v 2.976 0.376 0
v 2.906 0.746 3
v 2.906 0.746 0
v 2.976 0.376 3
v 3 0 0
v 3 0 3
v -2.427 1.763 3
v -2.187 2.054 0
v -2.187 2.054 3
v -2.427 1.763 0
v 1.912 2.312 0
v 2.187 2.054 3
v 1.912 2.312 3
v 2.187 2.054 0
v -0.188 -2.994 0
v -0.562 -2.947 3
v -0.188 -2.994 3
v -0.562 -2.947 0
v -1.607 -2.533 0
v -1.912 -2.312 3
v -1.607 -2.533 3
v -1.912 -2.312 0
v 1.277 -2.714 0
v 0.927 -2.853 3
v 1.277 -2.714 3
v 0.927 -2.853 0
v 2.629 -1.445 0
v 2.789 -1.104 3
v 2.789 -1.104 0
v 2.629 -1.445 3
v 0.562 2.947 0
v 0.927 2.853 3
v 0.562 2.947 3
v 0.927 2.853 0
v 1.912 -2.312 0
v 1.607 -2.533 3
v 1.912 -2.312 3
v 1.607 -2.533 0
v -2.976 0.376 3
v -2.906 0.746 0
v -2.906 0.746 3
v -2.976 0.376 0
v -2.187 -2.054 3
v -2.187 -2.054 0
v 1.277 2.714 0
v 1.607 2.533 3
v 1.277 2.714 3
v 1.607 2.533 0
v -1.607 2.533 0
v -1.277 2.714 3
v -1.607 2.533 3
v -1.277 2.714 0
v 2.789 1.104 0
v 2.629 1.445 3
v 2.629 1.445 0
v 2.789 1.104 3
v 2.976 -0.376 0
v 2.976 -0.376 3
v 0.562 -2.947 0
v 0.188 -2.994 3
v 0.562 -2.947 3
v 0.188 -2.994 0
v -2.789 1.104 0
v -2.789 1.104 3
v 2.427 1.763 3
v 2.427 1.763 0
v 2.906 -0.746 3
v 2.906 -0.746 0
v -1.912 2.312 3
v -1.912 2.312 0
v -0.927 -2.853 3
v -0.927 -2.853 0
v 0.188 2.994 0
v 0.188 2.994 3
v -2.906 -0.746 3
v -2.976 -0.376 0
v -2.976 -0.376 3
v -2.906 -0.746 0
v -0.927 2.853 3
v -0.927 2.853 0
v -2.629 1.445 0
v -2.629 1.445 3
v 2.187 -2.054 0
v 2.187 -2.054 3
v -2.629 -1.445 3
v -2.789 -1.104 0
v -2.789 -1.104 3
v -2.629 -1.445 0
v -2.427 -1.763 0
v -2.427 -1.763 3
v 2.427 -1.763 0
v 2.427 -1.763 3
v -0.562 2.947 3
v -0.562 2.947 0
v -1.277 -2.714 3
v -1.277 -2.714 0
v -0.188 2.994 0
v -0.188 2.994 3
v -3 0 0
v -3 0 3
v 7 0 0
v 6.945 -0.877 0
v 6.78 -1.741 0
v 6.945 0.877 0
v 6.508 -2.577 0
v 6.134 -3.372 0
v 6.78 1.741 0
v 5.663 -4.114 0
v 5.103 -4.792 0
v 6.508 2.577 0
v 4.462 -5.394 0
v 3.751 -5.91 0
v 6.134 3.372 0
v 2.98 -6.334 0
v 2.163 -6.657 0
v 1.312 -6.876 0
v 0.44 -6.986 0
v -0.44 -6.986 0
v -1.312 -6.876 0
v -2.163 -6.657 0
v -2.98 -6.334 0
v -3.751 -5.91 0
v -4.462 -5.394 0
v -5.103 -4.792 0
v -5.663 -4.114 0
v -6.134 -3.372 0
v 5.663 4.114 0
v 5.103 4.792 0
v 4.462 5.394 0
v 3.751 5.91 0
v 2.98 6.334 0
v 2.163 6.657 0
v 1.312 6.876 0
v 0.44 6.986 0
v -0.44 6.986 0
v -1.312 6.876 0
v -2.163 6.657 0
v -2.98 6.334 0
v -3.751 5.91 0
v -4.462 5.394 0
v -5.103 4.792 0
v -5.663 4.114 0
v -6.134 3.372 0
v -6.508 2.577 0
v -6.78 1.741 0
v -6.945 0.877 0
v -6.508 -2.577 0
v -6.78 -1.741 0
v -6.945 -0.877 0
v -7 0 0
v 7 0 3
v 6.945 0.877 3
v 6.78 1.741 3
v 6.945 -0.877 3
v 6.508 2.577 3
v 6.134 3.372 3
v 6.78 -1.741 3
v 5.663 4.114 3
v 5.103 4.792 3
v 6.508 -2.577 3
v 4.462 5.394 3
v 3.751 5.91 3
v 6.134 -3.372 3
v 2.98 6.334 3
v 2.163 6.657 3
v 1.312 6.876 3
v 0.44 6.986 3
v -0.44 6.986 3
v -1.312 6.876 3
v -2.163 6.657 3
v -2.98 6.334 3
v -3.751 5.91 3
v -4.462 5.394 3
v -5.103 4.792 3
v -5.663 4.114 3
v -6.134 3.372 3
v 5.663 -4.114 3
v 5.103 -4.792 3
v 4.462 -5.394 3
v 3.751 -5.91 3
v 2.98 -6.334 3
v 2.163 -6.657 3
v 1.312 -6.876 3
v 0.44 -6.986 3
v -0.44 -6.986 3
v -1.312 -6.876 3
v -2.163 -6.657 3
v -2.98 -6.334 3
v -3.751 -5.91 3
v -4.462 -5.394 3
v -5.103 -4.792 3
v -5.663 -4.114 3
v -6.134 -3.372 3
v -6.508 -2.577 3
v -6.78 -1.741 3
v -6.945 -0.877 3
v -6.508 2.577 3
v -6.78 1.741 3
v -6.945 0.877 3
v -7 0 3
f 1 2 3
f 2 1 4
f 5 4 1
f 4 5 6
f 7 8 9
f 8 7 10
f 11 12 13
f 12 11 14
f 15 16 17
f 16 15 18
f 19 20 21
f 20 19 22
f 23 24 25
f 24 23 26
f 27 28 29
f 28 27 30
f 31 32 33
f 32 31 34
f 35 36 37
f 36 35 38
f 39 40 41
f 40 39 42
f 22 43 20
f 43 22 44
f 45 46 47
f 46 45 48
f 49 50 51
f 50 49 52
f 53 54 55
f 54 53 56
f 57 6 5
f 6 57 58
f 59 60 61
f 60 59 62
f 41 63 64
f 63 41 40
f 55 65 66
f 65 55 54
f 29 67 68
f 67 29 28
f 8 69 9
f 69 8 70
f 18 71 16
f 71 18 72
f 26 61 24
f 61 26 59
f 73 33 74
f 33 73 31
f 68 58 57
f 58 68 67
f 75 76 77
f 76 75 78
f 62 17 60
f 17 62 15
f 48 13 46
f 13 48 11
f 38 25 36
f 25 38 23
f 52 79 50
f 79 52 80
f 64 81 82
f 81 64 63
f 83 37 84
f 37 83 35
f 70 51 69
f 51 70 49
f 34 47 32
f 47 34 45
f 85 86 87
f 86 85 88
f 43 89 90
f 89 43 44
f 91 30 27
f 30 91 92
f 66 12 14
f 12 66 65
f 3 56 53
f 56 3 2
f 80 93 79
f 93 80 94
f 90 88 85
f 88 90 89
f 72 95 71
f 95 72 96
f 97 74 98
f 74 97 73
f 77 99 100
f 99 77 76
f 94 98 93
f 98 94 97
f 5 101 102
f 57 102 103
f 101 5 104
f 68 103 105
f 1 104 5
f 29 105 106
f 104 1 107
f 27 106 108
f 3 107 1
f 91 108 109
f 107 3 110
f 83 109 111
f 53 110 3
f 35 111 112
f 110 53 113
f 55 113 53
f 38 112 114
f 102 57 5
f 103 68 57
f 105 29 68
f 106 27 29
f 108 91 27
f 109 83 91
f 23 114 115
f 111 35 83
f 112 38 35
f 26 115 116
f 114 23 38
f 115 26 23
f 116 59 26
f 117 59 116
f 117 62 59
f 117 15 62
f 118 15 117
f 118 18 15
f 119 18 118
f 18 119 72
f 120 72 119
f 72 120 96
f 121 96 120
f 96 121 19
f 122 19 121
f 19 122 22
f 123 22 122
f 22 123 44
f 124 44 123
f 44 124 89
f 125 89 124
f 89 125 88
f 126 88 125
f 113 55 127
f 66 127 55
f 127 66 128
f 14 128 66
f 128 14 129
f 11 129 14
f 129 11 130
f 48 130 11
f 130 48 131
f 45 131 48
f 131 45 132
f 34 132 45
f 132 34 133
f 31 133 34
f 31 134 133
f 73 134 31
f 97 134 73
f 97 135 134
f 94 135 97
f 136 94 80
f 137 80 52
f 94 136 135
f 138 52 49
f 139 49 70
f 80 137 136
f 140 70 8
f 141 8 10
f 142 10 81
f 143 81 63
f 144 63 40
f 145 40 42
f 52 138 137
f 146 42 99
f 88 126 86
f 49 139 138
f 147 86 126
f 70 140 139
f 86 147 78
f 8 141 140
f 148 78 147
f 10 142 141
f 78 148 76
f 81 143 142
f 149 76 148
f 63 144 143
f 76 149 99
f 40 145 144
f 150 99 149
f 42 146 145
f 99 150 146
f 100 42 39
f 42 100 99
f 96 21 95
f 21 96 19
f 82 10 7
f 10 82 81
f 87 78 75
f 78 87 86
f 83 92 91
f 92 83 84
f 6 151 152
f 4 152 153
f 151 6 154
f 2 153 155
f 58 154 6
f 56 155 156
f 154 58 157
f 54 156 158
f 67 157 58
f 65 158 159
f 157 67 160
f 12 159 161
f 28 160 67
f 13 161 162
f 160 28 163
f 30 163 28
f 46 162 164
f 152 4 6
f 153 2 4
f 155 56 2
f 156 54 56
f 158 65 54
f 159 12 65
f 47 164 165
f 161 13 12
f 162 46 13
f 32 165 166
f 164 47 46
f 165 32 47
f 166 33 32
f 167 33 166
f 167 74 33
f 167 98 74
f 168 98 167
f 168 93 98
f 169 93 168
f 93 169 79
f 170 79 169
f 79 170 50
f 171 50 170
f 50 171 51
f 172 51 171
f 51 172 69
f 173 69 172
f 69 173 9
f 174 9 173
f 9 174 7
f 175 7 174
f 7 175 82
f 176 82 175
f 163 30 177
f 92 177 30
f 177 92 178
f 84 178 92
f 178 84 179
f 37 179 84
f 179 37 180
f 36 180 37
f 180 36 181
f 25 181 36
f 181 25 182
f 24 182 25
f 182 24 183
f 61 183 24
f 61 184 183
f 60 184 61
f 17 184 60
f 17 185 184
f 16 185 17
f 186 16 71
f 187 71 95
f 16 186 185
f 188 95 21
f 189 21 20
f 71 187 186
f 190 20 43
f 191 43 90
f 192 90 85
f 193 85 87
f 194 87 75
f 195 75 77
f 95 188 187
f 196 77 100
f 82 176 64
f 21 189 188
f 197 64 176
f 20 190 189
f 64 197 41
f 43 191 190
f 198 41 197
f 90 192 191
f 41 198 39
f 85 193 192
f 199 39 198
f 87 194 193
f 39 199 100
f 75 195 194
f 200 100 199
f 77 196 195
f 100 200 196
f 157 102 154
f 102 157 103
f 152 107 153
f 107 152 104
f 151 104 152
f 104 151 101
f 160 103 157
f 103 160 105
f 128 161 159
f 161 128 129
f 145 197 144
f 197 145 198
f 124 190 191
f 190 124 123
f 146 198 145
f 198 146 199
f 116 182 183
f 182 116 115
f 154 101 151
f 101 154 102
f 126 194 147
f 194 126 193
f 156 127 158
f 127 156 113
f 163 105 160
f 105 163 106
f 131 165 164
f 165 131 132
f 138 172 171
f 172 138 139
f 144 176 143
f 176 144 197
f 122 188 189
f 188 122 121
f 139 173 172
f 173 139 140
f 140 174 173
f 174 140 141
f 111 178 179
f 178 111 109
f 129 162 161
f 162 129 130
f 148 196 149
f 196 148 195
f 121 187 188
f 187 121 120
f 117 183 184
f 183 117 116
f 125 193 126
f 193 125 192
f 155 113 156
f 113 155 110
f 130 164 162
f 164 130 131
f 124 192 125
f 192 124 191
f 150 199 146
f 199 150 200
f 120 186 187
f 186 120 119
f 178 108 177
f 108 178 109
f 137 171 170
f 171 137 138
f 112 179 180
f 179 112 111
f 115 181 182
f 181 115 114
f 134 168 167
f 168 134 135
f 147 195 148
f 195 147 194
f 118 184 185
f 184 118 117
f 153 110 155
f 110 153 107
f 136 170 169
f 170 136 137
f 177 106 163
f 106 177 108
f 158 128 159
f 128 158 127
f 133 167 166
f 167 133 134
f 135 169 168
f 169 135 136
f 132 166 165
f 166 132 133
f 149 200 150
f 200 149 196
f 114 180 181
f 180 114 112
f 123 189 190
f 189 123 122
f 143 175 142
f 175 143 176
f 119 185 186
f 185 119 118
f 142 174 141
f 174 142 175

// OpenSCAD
$fn = 50;

difference() {
	union() {
		cylinder(h = 3, r = 7.0);
	}
	union() {
		cylinder(h = 3, r = 3.0);
		cylinder(h = 3, r = 1.5);
	}
}
